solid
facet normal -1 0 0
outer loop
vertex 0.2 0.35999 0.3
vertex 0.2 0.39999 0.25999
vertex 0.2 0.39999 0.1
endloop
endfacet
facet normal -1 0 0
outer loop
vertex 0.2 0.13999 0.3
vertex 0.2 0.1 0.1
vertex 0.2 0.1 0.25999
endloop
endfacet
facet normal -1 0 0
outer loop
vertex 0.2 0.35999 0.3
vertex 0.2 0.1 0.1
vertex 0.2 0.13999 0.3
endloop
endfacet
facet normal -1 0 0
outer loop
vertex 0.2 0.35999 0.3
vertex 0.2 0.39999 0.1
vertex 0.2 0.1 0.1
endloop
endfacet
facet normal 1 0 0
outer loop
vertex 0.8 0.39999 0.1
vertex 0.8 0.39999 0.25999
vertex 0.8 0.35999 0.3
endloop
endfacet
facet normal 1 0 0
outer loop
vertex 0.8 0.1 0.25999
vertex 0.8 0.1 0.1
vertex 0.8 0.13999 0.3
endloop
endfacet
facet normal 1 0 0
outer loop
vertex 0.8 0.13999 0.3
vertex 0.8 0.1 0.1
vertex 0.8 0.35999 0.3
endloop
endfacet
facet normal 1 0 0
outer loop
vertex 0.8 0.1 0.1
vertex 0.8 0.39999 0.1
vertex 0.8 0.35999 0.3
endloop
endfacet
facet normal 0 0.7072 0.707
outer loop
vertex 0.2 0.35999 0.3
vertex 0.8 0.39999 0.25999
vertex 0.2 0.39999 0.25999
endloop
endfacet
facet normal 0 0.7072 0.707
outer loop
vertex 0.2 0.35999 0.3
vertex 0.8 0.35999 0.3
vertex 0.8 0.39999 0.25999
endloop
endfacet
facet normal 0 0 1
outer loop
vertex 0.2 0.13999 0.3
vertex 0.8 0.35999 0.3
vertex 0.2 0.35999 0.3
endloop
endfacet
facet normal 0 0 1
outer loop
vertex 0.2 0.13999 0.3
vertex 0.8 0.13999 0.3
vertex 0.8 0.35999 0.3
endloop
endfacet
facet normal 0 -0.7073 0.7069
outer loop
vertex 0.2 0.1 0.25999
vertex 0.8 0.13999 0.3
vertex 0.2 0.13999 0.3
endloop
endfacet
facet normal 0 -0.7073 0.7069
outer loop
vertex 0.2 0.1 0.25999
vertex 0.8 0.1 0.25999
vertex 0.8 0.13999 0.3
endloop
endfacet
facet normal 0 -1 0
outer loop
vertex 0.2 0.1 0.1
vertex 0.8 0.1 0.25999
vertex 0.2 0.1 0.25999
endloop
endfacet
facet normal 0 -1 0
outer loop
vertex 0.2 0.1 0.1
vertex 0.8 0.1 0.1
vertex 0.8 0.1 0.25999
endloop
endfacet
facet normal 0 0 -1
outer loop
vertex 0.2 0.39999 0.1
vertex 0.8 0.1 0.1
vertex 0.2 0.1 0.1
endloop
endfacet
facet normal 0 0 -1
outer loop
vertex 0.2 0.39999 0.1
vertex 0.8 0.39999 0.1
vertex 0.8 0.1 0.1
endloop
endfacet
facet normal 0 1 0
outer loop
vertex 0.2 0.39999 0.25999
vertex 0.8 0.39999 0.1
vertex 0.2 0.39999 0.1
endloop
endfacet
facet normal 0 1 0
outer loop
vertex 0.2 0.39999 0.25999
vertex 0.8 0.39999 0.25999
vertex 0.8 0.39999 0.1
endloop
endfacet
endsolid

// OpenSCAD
translate([0.2, 0.1, 0.1])
rotate([90,0,90])
        linear_extrude(.6, false, convexity=1, twist=0, slices=1) {
polygon([[0, 0.0], [0.3, 0],
[0.3, 0.16], [0.26, 0.2], [0.04, 0.2], [0, 0.16]]);
        }
